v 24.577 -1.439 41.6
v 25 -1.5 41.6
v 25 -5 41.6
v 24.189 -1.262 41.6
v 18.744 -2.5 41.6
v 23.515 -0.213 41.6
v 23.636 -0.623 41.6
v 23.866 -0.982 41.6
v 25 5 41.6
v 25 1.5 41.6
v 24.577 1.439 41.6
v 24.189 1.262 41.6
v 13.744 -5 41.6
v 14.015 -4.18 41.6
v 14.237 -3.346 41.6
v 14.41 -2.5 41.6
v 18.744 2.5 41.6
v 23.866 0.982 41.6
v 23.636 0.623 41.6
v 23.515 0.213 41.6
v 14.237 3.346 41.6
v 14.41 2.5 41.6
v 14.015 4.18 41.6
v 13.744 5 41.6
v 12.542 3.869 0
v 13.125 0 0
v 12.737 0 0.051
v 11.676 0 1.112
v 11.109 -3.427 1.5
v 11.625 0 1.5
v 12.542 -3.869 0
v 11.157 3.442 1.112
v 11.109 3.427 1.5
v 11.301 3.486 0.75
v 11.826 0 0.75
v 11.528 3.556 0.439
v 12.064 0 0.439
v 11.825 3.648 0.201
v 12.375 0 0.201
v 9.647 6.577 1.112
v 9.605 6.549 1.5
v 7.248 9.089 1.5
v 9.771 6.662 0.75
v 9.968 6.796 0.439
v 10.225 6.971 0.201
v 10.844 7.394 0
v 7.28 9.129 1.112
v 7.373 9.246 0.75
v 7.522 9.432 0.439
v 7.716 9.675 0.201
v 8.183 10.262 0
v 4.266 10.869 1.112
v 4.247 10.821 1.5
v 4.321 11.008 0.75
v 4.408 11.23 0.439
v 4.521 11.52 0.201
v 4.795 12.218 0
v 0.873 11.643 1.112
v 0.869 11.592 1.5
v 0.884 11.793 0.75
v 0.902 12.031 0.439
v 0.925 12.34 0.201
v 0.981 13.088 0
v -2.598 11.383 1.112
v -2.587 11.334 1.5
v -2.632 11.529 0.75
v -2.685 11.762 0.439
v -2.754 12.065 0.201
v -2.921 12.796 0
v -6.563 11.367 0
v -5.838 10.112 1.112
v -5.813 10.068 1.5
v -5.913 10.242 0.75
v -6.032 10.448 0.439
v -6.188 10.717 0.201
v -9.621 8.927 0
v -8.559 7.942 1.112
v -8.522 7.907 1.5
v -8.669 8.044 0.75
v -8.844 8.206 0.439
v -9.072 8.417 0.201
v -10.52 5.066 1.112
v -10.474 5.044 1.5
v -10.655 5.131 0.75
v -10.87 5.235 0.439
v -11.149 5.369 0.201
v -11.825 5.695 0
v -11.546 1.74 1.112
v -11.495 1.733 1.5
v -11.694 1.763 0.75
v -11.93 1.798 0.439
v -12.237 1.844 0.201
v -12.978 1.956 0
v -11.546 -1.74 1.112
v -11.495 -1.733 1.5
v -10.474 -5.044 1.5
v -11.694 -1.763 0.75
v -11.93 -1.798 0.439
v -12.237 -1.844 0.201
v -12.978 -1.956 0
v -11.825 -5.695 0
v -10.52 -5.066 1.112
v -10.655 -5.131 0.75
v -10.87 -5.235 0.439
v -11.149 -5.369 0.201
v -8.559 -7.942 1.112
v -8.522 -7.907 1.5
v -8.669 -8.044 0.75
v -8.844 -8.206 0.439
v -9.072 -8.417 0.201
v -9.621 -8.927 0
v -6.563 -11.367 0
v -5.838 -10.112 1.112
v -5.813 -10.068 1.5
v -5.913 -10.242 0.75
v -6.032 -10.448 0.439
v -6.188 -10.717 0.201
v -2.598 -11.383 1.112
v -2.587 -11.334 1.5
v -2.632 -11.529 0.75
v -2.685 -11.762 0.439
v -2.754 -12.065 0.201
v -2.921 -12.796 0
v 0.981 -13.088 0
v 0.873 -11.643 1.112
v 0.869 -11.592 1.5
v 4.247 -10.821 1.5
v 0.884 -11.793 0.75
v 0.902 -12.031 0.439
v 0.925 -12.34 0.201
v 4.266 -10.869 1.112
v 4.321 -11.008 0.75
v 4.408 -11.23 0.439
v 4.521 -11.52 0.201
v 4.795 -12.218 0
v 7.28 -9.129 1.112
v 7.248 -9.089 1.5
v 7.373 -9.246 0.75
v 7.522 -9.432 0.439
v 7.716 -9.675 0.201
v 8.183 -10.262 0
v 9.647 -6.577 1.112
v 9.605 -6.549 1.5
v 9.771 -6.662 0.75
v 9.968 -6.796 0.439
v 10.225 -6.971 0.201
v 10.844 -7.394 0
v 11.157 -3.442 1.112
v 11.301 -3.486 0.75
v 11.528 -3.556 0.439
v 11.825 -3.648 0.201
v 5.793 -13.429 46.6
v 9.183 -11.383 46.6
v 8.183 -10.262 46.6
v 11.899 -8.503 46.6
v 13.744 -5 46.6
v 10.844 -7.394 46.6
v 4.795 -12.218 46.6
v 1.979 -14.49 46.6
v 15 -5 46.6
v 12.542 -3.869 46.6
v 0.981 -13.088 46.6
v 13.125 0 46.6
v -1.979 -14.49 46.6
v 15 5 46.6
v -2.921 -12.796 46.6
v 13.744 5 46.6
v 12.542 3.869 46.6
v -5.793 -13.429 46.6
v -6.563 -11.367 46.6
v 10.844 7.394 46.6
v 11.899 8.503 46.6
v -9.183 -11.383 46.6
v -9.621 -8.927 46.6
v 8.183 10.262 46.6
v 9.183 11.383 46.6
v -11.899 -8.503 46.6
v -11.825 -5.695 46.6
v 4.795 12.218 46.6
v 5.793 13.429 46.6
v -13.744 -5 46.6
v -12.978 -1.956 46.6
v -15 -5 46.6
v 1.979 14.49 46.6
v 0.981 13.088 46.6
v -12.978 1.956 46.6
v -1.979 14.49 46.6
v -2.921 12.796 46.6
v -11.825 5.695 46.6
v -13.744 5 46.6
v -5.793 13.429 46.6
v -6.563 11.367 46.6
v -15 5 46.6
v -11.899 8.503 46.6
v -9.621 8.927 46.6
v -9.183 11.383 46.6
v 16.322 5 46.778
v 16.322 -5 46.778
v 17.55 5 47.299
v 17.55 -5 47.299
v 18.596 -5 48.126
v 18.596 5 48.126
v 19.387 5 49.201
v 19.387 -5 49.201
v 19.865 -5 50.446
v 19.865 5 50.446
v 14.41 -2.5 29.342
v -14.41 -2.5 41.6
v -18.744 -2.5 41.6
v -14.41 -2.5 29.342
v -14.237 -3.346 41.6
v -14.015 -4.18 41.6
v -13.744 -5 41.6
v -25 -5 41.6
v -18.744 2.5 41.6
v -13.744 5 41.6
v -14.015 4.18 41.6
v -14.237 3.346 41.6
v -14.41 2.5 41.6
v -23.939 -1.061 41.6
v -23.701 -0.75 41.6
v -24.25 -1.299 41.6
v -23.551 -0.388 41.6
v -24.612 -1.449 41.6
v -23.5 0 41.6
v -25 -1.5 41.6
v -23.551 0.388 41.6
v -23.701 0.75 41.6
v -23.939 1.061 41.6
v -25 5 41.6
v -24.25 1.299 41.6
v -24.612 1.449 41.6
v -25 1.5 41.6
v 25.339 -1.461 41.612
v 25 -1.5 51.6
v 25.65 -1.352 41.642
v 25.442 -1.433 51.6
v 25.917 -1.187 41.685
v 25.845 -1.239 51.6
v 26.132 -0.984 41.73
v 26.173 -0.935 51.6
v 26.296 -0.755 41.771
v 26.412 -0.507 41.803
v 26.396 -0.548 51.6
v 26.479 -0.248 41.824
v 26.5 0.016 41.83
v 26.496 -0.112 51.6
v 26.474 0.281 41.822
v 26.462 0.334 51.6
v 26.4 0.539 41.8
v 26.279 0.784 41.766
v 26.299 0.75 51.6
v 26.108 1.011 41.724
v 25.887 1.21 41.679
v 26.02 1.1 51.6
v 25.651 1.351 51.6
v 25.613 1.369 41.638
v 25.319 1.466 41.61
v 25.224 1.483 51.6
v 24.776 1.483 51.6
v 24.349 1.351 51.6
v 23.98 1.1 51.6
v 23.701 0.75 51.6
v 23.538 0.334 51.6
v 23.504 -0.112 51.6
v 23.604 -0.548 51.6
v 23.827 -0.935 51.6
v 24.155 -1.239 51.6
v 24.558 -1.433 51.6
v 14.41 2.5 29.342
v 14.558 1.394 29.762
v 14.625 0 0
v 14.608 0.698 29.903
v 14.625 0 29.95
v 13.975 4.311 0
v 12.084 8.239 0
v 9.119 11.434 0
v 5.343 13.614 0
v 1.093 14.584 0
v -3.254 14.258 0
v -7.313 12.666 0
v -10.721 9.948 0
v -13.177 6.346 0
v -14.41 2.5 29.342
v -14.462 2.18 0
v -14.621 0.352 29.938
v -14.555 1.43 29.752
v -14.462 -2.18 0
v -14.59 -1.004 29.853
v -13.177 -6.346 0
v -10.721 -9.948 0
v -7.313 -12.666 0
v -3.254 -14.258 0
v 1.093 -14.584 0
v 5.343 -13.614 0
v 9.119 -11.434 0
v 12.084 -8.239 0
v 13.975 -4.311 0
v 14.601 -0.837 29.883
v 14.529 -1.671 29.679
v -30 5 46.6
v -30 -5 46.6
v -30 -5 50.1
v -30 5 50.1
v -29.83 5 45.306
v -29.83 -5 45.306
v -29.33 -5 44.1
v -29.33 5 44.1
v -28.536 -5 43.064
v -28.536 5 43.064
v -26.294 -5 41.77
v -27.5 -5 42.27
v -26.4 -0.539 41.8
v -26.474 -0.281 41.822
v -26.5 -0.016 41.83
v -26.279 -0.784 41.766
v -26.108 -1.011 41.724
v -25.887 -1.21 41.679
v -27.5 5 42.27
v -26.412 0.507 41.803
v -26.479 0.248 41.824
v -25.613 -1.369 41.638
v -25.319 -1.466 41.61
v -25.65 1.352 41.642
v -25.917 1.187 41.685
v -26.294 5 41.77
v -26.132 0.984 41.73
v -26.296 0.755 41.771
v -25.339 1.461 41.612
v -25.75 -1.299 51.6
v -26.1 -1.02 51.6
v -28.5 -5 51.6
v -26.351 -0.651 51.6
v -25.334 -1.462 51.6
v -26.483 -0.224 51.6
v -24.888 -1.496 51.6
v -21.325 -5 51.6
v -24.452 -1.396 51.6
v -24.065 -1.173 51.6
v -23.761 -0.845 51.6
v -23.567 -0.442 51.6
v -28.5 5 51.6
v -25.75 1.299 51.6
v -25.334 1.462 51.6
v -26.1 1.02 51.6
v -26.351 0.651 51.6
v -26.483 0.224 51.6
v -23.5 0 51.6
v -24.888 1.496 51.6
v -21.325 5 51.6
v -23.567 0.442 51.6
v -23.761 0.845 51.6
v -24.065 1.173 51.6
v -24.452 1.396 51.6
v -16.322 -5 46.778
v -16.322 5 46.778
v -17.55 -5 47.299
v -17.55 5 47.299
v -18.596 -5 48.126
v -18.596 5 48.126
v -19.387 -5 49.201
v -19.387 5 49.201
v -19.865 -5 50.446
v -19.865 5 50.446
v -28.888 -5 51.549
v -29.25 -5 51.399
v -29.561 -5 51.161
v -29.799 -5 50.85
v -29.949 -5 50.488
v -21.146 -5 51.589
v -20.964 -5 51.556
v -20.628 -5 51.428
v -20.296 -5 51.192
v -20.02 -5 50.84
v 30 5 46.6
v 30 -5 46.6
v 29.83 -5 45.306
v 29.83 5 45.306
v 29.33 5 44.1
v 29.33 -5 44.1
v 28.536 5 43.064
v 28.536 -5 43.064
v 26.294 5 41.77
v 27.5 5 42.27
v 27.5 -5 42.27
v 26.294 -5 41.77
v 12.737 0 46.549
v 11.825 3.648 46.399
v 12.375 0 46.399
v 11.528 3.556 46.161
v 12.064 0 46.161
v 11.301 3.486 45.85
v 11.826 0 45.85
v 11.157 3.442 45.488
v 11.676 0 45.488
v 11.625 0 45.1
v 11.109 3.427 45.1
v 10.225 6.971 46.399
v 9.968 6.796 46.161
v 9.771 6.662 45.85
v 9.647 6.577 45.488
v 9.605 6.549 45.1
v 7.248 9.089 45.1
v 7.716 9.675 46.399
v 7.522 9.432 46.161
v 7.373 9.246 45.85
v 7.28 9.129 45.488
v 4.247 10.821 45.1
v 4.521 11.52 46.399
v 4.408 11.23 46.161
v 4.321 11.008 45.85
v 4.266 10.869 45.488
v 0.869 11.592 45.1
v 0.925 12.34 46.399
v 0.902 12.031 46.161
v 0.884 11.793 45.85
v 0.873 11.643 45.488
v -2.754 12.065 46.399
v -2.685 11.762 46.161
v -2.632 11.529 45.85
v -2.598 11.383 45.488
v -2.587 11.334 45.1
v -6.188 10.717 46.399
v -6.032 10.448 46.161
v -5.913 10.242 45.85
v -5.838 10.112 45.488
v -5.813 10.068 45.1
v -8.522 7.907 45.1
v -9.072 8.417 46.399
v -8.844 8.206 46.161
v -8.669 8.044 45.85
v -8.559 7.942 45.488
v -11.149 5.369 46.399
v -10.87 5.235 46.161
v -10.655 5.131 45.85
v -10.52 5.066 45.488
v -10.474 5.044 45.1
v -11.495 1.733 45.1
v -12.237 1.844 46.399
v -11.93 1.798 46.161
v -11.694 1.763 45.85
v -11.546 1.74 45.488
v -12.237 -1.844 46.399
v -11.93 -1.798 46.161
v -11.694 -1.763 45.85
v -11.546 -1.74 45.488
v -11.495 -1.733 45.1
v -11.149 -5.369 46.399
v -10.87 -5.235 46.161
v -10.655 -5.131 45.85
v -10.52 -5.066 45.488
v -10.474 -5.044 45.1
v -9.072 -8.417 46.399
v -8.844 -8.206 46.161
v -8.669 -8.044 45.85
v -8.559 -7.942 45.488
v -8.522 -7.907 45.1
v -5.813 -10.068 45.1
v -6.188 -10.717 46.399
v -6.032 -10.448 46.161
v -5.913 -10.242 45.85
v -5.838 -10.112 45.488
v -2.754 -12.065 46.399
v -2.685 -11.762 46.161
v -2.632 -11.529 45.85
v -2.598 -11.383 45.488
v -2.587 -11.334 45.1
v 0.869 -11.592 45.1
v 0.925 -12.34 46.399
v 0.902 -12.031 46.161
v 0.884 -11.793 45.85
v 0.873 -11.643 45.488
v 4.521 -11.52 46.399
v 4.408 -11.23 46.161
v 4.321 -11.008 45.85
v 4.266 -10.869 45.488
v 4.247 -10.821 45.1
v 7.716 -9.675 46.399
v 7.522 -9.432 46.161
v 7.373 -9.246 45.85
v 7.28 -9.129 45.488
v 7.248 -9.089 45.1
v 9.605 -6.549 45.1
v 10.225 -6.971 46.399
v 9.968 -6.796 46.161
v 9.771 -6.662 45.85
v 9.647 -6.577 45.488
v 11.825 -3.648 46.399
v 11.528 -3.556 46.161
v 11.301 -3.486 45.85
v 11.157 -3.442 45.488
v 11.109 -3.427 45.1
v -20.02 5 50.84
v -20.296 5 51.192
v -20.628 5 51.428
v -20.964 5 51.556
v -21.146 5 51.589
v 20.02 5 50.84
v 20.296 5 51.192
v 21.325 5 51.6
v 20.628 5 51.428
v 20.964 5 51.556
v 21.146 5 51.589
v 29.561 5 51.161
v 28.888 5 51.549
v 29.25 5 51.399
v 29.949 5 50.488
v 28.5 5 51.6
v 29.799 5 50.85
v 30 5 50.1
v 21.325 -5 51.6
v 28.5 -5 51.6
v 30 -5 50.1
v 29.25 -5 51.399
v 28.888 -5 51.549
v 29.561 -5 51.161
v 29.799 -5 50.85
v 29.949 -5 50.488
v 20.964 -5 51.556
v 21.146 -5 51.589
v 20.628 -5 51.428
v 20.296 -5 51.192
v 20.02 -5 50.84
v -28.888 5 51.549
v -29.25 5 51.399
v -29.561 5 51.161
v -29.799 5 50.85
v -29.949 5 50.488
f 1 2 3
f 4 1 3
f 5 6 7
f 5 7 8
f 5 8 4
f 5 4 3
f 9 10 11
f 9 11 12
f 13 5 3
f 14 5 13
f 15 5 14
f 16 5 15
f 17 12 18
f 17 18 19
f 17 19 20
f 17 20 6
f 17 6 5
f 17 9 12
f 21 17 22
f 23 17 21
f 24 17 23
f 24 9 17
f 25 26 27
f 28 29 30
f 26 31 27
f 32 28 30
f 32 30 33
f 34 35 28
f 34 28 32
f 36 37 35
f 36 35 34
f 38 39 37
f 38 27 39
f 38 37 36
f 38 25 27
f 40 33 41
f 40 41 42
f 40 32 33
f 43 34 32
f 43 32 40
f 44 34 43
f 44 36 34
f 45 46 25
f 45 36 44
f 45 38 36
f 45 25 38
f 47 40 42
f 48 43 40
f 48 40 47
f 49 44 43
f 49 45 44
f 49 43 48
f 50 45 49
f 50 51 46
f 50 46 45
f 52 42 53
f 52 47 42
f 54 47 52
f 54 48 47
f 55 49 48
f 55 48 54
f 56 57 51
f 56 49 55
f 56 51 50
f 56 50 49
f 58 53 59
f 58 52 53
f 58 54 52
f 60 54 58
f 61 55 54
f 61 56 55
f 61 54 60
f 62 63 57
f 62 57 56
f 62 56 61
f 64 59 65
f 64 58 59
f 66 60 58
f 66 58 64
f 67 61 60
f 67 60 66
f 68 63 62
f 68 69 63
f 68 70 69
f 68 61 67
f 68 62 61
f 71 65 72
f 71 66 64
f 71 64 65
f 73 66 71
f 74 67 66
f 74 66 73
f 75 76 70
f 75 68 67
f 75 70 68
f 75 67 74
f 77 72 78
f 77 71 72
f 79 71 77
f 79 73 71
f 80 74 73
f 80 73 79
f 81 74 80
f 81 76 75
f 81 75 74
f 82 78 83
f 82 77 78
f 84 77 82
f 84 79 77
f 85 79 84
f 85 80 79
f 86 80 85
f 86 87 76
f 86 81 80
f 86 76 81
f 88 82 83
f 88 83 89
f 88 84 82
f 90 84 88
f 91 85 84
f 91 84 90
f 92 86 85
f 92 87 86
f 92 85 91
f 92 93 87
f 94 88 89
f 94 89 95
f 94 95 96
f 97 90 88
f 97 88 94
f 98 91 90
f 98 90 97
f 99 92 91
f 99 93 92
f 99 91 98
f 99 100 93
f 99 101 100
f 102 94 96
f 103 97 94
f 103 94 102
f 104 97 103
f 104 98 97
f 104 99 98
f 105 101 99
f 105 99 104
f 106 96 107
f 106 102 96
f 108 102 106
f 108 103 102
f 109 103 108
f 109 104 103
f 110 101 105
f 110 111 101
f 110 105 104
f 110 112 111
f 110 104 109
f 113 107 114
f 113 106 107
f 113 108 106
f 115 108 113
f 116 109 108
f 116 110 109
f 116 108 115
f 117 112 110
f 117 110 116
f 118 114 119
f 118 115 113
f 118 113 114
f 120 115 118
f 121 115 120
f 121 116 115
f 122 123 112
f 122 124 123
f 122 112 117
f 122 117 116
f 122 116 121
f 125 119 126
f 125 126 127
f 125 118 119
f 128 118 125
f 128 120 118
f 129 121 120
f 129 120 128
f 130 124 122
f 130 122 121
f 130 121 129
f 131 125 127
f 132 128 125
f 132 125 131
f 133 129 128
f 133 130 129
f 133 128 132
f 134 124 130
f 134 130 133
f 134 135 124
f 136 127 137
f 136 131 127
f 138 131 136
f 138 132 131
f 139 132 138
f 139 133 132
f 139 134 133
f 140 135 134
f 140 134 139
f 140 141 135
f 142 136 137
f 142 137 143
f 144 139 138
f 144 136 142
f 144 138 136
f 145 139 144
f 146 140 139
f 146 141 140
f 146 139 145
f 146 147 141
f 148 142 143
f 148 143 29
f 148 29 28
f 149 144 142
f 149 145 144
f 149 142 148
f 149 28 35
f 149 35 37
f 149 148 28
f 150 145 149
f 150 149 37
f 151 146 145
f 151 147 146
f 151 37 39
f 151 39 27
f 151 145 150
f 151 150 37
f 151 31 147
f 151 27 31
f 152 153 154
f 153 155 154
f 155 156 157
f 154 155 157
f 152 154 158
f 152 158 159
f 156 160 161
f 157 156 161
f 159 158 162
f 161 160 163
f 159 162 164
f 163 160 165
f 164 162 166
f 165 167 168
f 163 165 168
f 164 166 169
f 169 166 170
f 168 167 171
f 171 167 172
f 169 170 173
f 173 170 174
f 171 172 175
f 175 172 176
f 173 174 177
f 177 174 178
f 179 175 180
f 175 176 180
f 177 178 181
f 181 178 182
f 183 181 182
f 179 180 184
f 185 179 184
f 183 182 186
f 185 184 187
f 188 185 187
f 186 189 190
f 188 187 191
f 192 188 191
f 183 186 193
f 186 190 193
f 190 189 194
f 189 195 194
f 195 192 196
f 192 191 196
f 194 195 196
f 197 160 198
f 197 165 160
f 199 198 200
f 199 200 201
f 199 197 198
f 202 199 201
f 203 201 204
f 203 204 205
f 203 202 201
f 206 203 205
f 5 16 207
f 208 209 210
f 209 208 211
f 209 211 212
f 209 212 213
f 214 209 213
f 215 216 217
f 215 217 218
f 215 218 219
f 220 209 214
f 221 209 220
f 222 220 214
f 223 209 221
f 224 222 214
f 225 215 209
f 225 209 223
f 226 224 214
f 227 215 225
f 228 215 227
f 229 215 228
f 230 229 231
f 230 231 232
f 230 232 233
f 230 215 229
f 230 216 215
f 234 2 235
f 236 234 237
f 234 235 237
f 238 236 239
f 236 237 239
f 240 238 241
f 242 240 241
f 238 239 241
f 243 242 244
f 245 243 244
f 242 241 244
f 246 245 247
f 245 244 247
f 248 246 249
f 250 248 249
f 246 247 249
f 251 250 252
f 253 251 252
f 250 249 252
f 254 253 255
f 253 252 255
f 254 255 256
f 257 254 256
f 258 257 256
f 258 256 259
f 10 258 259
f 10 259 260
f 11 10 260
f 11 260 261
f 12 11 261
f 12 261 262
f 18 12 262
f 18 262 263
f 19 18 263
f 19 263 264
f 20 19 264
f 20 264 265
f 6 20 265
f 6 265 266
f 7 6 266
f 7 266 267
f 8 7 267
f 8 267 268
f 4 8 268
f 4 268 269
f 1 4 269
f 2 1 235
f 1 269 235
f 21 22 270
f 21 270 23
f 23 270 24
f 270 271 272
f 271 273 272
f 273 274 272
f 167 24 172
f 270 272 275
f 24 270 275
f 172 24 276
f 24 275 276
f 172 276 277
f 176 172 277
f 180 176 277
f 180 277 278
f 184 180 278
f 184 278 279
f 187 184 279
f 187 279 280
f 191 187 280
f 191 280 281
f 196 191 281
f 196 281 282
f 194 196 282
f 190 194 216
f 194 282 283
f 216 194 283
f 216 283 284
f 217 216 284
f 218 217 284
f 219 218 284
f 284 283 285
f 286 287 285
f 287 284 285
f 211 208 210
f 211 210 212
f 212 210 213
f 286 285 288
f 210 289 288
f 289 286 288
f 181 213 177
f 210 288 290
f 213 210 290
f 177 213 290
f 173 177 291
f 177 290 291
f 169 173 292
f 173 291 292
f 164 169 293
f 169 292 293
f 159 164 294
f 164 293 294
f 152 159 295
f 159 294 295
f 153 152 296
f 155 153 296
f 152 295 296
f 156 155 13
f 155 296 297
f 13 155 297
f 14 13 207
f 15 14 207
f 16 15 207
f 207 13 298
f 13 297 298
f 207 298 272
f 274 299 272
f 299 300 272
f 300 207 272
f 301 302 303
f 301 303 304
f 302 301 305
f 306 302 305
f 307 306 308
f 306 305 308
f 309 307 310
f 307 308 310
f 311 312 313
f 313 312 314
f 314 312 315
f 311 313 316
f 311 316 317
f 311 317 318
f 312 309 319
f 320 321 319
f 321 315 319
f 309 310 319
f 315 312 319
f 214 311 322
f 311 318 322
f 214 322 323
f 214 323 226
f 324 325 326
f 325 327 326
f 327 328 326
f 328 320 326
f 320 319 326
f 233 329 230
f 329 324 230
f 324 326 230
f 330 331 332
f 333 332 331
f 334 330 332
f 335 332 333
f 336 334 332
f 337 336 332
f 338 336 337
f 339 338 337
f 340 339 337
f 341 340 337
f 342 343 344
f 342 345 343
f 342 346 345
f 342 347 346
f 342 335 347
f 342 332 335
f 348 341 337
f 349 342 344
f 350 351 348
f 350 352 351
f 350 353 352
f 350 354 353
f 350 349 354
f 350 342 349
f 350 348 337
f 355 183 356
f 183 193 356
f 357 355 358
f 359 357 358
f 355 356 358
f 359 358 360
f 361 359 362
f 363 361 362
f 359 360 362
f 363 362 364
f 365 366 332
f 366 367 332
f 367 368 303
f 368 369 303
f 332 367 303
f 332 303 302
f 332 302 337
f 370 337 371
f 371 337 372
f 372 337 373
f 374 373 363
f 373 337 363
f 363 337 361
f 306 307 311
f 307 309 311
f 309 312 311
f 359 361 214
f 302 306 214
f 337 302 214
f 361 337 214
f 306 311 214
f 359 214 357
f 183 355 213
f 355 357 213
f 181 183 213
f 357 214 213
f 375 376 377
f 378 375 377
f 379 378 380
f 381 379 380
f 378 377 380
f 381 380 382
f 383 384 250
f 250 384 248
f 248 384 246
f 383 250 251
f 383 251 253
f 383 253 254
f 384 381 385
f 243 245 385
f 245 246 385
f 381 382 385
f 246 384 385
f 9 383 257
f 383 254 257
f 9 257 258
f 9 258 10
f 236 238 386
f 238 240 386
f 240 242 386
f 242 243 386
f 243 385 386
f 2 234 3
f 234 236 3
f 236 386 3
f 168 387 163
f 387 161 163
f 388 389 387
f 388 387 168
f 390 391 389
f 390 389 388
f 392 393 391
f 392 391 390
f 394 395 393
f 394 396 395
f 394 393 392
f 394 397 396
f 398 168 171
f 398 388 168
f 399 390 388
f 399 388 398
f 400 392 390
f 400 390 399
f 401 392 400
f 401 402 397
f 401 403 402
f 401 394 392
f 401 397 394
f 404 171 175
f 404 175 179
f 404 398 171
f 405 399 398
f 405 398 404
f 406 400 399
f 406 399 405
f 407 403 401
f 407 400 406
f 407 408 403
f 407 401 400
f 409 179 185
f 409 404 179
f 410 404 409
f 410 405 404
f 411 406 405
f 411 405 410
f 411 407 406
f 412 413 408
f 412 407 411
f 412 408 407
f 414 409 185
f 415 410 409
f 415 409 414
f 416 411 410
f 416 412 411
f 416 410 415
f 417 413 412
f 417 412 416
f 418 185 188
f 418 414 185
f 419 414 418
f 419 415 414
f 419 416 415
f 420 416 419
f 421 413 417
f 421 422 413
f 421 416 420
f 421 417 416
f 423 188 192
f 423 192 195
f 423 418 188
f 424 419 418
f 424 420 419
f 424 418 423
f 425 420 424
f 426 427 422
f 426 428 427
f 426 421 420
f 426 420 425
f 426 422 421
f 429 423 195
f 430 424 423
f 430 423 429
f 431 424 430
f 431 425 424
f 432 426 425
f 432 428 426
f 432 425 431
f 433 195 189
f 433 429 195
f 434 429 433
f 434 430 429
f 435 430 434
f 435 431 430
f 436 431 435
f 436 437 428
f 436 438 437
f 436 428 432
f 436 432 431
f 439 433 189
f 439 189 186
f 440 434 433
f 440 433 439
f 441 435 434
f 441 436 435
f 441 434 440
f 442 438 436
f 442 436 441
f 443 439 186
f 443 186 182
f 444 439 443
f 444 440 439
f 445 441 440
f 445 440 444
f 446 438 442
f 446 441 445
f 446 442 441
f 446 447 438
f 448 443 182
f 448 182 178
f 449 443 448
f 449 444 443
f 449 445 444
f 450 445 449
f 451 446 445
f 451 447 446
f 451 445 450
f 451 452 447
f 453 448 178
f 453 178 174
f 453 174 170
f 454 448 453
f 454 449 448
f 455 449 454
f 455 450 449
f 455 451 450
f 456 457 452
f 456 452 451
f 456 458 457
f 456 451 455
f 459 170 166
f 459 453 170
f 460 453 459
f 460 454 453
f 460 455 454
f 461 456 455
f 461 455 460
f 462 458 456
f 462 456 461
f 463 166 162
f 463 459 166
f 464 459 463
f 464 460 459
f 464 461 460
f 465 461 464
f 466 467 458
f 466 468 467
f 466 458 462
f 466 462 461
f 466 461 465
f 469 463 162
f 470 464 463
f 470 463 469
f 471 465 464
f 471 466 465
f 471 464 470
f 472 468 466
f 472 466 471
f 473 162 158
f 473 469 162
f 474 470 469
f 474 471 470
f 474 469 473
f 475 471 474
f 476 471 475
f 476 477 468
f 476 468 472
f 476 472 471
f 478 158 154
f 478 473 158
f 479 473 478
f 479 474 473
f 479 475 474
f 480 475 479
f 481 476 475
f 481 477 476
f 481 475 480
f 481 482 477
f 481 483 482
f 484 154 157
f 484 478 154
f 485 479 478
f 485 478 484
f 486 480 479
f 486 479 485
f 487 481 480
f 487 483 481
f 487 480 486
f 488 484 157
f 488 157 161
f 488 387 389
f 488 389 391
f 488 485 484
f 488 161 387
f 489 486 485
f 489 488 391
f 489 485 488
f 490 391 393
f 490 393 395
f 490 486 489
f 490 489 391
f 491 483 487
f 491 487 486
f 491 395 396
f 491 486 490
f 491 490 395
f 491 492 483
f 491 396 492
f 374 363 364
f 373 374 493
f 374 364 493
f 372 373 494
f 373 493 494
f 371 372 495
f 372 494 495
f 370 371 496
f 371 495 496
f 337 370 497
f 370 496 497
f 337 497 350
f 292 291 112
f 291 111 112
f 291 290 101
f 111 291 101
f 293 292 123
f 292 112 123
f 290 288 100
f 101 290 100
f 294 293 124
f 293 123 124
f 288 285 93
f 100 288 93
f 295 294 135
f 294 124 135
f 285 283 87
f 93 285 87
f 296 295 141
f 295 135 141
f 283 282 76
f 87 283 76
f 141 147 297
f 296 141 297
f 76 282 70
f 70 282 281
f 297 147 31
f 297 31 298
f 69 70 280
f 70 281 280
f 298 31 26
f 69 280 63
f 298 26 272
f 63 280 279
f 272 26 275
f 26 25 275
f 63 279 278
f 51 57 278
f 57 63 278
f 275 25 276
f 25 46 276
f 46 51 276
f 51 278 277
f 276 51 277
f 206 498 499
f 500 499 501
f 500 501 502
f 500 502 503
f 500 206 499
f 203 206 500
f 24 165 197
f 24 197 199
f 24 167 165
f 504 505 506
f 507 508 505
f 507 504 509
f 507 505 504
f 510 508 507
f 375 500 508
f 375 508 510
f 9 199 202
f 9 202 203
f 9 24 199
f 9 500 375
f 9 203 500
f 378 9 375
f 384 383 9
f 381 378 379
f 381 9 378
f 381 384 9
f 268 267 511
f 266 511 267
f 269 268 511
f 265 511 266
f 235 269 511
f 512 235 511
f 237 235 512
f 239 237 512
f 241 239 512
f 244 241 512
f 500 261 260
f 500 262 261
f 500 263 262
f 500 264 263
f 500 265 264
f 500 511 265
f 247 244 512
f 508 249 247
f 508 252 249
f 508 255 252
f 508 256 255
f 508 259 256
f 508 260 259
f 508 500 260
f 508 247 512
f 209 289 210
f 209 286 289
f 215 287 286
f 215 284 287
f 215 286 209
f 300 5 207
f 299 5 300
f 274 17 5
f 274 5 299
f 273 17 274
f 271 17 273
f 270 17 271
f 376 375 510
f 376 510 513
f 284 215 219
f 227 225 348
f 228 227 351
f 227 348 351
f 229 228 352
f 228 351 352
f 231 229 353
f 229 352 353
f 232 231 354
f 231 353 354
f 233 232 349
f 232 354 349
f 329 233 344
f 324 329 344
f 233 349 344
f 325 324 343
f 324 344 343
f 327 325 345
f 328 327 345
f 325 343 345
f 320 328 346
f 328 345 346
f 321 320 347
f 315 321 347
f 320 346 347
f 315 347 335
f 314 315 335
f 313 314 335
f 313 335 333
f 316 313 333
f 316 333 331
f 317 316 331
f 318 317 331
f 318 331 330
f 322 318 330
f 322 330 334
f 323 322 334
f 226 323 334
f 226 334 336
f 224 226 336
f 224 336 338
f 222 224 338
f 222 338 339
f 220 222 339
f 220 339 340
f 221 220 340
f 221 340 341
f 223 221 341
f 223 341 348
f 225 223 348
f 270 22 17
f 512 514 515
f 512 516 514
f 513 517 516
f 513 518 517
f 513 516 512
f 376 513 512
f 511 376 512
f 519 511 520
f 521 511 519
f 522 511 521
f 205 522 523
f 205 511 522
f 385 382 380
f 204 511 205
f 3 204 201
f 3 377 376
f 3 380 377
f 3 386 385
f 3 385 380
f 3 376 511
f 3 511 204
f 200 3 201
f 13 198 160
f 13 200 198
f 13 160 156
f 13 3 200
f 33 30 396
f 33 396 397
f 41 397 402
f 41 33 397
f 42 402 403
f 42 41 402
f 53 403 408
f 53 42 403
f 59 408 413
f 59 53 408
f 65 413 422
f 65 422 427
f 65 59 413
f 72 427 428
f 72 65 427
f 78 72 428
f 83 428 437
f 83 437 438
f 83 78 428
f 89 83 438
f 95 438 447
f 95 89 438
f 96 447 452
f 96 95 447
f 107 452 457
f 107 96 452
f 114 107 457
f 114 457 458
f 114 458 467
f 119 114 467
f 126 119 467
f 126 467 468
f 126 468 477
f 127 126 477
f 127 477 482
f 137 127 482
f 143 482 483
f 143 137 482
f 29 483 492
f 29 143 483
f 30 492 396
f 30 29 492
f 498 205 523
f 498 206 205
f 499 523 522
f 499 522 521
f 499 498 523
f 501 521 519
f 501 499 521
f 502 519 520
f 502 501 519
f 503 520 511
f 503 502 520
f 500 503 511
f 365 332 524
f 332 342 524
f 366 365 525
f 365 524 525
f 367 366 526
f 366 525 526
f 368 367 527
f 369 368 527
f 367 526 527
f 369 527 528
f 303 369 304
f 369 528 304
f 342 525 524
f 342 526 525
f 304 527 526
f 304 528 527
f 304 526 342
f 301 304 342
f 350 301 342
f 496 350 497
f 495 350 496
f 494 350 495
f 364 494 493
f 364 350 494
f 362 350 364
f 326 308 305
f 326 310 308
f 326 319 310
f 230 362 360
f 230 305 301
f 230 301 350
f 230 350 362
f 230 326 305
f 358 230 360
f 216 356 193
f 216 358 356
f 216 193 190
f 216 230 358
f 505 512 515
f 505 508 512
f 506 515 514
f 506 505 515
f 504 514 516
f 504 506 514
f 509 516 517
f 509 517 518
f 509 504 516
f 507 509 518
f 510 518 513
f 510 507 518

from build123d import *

# Parameters (mm, degrees)
ESQUISSE1_R             = 14.625
ESQUISSE1_R_2           = 11.625
BOSS_EXTRU_1_DEPTH      = 46.6
BOSS_EXTRU_3_START      = -5
BOSS_EXTRU_3_DEPTH      = 5
ESQUISSE3_W             = 10
ESQUISSE3_H             = 10
BOSS_EXTRU_4_DEPTH      = 5
CONG_1_R                = 5
BOSS_EXTRU_6_START      = -2.5
BOSS_EXTRU_6_DEPTH      = 5
CONG_2_R                = 5
ESQUISSE5_R             = 1.5
ENL_V_MAT_EXTRU_1_DEPTH = 62.452832522
CONG_3_R                = 1.5
CONG_4_R                = 1.5


with BuildPart() as part:
    # Esquisse1 → Boss.-Extru.1 (new body)
    with BuildSketch(Plane.XY):
        Circle(ESQUISSE1_R)
        Circle(ESQUISSE1_R_2, mode=Mode.SUBTRACT)
    extrude(amount=BOSS_EXTRU_1_DEPTH)

    # Esquisse2 → Boss.-Extru.3 (add)
    with BuildSketch(Plane.XY.offset(46.6).offset(BOSS_EXTRU_3_START)):
        with BuildLine():
            Line((-30, 5), (-13.743748579, 5))
            ThreePointArc((-13.743748579, 5), (-14.625, 0), (-13.743748579, -5))
            Line((-13.743748579, -5), (-30, -5))
            Line((-30, -5), (-30, 5))
        make_face()
        with BuildLine():
            Line((30, 5), (30, -5))
            Line((30, -5), (13.743748579, -5))
            ThreePointArc((13.743748579, -5), (14.625, 0), (13.743748579, 5))
            Line((13.743748579, 5), (30, 5))
        make_face()
    extrude(amount=BOSS_EXTRU_3_DEPTH)

    # Esquisse3 → Boss.-Extru.4 (add)
    with BuildSketch(Plane.XY.offset(46.6)):
        with Locations((-25, 0)):
            Rectangle(ESQUISSE3_W, ESQUISSE3_H)
        with Locations((25, 0)):
            Rectangle(ESQUISSE3_W, ESQUISSE3_H)
    extrude(amount=BOSS_EXTRU_4_DEPTH)

    # Congé1
    cong_1_edges = [part.edges().sort_by_distance(p)[0] for p in [
        (30, 0, 41.6),
        (-30, 0, 41.6),
    ]]
    fillet(cong_1_edges, radius=CONG_1_R)

    # Esquisse4 → Boss.-Extru.6 (add)
    with BuildSketch(Plane(origin=(0, 5, 0), x_dir=(1, 0, 0), z_dir=(0, 1, 0)).offset(BOSS_EXTRU_6_START)):
        Polygon((-18.743748579, -41.6), (-13.743748579, -41.6), (-13.743748579, -27.457864376), align=None)
        Polygon((13.743748579, -27.457864376), (13.743748579, -41.6), (18.743748579, -41.6), align=None)
    extrude(amount=-BOSS_EXTRU_6_DEPTH)

    # Congé2
    cong_2_edges = [part.edges().sort_by_distance(p)[0] for p in [
        (20, 0, 46.6),
        (-20, 0, 46.6),
    ]]
    fillet(cong_2_edges, radius=CONG_2_R - 0.0001)  # a hair under: the kernel refuses the full size

    # Esquisse5 → Enlèv. mat.-Extru.1 (cut, through all)
    with BuildSketch(Plane.XY.offset(51.6)):
        with Locations((-25, 0)):
            Circle(ESQUISSE5_R)
        with Locations(Location((25, 0, 0), (0, 0, 270))):
            Circle(ESQUISSE5_R)
    extrude(amount=-ENL_V_MAT_EXTRU_1_DEPTH, mode=Mode.SUBTRACT)

    # Congé3
    cong_3_edges = [part.edges().sort_by_distance(p)[0] for p in [
        (-30, 0, 51.6),
        (-20, 0, 51.6),
        (20, 0, 51.6),
        (30, 0, 51.6),
    ]]
    fillet(cong_3_edges, radius=CONG_3_R)

    # Congé4
    cong_4_edges = [part.edges().sort_by_distance(p)[0] for p in [
        (-11.625, 0, 0),
        (-11.625, 0, 46.6),
    ]]
    fillet(cong_4_edges, radius=CONG_4_R)


solid = part.part
